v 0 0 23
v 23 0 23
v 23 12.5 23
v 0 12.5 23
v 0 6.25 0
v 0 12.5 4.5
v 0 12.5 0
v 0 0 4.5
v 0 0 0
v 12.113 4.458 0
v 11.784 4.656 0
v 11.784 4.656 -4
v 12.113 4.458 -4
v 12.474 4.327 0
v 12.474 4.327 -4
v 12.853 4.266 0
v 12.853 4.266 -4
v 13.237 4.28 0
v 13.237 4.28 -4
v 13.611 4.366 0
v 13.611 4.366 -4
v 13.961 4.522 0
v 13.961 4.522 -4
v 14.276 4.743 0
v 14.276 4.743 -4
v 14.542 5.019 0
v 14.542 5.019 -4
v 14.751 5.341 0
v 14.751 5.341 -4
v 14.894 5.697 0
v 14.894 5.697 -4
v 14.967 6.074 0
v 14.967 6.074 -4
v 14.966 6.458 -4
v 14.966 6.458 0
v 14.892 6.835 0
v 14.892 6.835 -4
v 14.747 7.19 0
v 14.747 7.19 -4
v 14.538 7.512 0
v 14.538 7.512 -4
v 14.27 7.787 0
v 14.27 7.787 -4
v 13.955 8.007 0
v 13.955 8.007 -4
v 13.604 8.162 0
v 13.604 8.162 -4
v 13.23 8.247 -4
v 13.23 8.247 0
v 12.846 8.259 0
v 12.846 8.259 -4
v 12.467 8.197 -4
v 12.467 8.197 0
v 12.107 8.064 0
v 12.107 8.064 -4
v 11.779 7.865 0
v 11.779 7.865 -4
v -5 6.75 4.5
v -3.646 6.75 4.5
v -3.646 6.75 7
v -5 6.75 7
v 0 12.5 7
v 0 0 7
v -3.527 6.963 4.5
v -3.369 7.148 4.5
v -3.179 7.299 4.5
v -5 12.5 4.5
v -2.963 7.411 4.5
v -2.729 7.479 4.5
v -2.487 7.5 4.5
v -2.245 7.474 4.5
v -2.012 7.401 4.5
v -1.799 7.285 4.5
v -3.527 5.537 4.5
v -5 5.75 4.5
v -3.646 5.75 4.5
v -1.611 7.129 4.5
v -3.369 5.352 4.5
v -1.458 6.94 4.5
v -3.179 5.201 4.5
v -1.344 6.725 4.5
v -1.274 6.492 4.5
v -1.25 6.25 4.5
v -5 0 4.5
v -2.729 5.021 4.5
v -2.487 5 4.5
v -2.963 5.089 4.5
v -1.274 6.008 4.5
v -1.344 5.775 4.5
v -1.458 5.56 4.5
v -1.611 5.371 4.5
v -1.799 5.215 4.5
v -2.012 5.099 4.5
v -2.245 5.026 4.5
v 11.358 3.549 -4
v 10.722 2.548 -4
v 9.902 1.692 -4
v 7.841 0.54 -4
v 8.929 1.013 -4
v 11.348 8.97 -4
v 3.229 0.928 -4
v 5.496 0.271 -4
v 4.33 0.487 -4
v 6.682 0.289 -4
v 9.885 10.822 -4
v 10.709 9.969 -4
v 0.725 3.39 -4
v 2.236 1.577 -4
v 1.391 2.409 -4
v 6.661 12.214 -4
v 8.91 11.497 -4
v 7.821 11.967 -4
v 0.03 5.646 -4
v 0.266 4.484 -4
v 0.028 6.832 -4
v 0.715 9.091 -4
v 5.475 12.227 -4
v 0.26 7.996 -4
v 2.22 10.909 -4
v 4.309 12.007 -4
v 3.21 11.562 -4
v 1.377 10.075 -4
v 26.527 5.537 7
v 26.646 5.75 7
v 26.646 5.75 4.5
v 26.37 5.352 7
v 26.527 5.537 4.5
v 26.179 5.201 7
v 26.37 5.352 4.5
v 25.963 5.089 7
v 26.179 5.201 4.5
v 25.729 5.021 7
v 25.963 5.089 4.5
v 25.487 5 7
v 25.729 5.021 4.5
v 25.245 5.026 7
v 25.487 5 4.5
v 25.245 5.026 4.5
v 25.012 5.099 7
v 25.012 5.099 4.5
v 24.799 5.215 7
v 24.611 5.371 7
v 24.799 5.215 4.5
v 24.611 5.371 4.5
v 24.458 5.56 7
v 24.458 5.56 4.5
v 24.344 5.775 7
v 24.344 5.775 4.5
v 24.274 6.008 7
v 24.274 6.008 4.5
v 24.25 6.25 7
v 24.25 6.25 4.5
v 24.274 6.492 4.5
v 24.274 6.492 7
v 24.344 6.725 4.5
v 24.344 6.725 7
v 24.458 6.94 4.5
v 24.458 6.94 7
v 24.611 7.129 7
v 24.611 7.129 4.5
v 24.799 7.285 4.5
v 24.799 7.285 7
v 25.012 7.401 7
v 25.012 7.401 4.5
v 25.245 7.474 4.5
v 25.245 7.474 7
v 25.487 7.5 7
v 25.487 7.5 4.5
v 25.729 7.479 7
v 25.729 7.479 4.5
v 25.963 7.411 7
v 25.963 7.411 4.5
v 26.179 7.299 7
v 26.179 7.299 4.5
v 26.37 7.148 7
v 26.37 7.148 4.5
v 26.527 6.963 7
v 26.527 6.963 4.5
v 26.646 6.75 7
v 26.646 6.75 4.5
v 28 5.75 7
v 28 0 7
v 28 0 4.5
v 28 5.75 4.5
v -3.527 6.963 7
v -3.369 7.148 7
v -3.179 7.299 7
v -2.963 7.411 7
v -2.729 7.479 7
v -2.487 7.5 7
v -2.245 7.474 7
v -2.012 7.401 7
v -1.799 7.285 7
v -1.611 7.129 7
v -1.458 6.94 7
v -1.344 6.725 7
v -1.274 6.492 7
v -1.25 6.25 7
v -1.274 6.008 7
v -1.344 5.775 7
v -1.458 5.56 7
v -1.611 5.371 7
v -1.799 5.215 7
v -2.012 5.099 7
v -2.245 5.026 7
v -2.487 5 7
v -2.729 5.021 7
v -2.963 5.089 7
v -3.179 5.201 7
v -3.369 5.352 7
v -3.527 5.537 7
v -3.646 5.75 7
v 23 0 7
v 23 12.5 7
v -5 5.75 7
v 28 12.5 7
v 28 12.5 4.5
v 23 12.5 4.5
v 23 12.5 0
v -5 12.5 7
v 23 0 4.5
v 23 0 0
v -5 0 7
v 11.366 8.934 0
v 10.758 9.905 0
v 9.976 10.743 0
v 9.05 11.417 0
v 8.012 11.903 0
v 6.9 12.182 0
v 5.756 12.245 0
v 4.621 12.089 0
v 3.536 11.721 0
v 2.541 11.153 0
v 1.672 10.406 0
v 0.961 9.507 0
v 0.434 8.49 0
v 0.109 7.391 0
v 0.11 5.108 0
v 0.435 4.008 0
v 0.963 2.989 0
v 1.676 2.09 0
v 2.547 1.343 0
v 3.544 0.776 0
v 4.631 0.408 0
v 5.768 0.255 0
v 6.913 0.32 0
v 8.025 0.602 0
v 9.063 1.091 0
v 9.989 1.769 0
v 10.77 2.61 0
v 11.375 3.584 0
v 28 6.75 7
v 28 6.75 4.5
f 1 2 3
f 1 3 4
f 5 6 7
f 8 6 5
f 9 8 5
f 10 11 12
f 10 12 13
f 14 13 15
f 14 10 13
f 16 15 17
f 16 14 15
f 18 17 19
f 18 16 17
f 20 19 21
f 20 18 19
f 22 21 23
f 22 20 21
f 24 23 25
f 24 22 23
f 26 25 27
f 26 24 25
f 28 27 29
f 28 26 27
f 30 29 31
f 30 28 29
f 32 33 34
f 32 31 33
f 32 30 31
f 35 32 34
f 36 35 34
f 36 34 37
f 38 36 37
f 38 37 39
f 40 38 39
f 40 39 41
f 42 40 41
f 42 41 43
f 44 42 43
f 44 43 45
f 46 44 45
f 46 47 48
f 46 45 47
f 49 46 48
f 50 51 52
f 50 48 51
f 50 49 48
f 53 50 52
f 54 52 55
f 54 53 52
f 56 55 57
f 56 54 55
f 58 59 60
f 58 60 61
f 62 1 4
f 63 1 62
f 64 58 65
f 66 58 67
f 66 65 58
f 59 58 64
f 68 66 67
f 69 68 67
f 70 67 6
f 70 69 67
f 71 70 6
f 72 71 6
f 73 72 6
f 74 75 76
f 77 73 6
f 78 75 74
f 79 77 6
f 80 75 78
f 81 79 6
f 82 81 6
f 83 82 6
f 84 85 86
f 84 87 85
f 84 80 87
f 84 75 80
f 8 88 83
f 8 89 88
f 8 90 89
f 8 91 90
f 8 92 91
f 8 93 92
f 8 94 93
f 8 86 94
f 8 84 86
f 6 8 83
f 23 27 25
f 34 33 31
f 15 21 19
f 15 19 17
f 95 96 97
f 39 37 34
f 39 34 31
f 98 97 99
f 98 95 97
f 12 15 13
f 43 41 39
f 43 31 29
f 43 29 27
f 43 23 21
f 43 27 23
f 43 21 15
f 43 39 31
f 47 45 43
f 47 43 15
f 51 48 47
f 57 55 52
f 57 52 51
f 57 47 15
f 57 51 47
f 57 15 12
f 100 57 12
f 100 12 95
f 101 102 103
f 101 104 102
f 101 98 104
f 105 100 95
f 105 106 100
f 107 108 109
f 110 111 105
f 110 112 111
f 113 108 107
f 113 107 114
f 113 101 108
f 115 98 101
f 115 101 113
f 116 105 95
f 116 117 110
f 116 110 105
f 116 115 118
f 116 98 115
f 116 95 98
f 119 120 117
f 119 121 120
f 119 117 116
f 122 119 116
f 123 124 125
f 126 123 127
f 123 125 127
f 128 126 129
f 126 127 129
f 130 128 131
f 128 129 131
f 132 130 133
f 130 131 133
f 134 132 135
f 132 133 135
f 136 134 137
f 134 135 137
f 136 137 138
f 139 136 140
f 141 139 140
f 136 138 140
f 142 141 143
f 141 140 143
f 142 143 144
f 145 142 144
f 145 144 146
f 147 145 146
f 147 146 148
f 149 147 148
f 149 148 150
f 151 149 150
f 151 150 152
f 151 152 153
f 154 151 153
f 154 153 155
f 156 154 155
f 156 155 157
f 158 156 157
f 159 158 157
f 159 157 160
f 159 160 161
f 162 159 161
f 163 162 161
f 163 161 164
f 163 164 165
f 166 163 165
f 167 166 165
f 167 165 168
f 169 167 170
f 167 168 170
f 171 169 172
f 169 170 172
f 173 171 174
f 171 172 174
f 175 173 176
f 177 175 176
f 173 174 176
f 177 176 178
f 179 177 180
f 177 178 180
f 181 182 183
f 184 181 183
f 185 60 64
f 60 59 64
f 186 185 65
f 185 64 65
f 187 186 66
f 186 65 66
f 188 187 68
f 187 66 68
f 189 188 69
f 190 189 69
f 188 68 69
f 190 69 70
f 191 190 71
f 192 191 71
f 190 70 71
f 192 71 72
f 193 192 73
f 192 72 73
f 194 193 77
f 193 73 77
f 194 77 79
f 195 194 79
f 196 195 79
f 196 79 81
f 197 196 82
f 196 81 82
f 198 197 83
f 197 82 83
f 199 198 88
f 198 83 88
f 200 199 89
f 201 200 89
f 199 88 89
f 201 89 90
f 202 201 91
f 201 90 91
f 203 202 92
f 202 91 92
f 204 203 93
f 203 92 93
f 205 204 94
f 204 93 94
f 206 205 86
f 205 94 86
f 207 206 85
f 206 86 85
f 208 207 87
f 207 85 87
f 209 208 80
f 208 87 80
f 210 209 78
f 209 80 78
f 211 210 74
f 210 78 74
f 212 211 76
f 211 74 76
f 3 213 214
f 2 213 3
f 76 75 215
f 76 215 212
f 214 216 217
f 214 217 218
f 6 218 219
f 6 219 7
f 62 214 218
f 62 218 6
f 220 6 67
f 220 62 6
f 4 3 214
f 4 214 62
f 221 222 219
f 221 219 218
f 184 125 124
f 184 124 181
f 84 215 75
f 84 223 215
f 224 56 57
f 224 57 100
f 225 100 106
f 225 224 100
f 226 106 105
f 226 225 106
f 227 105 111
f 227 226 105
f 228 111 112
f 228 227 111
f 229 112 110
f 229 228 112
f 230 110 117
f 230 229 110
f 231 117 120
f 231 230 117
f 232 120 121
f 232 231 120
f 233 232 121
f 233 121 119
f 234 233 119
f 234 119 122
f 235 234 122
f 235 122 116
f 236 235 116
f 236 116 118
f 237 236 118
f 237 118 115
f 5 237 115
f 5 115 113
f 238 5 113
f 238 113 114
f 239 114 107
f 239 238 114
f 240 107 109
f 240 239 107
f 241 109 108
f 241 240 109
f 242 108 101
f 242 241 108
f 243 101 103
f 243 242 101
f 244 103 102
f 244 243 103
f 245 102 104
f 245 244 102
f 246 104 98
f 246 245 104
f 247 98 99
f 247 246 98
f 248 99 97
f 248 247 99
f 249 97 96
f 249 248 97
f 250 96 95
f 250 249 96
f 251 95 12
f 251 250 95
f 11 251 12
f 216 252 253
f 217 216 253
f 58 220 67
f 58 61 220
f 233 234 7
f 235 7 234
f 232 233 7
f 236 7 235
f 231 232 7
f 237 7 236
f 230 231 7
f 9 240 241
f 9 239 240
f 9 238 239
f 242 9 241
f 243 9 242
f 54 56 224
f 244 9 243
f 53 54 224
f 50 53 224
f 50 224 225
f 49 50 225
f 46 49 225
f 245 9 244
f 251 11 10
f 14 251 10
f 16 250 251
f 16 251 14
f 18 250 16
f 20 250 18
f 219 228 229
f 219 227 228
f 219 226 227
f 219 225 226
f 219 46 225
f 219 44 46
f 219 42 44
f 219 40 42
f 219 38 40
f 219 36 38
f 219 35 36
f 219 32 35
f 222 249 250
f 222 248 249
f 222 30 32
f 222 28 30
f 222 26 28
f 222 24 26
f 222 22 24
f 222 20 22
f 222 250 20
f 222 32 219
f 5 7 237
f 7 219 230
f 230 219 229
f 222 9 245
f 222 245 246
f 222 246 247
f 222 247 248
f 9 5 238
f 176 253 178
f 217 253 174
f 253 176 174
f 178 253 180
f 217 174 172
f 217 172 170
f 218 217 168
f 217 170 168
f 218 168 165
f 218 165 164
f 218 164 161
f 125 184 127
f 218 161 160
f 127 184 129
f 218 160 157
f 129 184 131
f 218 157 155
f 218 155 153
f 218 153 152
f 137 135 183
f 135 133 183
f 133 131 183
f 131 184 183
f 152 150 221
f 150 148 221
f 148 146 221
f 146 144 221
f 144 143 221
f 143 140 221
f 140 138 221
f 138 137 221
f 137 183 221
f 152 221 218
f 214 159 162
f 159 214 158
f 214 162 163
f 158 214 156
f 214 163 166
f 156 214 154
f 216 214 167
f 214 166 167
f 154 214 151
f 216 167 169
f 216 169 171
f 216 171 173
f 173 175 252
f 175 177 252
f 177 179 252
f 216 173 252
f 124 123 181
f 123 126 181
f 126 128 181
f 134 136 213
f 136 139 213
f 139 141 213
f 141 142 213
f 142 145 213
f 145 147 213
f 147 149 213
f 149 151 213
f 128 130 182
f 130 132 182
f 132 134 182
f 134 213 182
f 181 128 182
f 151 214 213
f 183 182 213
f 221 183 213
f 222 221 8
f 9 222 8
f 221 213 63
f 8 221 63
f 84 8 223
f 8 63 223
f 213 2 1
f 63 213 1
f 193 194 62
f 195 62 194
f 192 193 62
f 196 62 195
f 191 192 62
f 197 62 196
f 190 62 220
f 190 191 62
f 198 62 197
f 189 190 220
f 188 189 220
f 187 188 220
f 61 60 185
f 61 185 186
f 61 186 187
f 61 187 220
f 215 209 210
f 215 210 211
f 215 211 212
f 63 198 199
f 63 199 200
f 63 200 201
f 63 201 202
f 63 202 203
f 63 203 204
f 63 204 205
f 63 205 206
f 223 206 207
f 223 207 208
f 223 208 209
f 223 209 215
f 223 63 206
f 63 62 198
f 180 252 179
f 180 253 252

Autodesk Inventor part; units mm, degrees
ref_plane "YZ Plane" through (0, 0, 0) normal (1, 0, 0) x (0, 1, 0)
ref_plane "XZ Plane" through (0, 0, 0) normal (0, 1, 0) x (-1, 0, 0)
ref_plane "XY Plane" through (0, 0, 0) normal (0, 0, 1) x (1, 0, 0)
sketch "Sketch1" plane through (0, 0, 0) normal (0, 1, 0) x (-1, 0, 0)
  line L0 (0, 0) -> (-23, 0)
  line L1 (-23, 0) -> (-23, 23)
  line L2 (-23, 23) -> (0, 23)
  line L3 (0, 23) -> (0, 0)
  line L4 (-23, 0) -> (-23, 7)
  line L5 (-23, 7) -> (-28, 7)
  line L6 (-28, 7) -> (-28, 4.5)
  line L7 (-28, 4.5) -> (-23, 4.5)
  line L8 (0, 7) -> (5, 7)
  line L9 (5, 7) -> (5, 4.5)
  line L10 (5, 4.5) -> (0, 4.5)
  dimension "d0" = 23
  dimension "d1" = 23
  dimension "d2" = 7
  dimension "d3" = 5
  dimension "d4" = 2.5
extrude "Extrusion1" add sketch "Sketch1" along normal blind 12.5
sketch "Sketch2" plane through (23, 0, 0) normal (0, 0, -1) x (-1, 0, 0)
  line L0 (23, 0) -> (23, 6.25)
  arc A0 (11.2156, 4.6561) -> (11.2214, 7.865) centre (17, 6.25) ccw
  arc A1 (11.2214, 7.865) -> (11.2156, 4.6561) centre (10.0244, 6.2627) ccw
extrude "Extrusion2" add sketch "Sketch2" along normal blind 4
sketch "Sketch3" plane through (28, 0, 4.5) normal (0, 0, -1) x (-1, 0, 0)
  line L0 (0, 0) -> (0, 12.5) projected
  line L1 (0, 6.25) -> (2.5, 6.25)
  circle A0 centre (2.5, 6.25) radius 1.25
  point P0 (28, 0)
  dimension "d11" = 2.5
  dimension "d12" = 2.5
extrude "Extrusion3" cut sketch "Sketch3" against normal blind 2.5
sketch "Sketch4" plane through (28, 0, 4.5) normal (0, 0, -1) x (-1, 0, 0)
  circle A0 centre (2.5, 6.25) radius 1.25 projected
  line L0 (0, 0) -> (0, 12.5) projected
  line L1 (1.25, 5.75) -> (0, 5.75)
  line L2 (1.25, 6.75) -> (0, 6.75)
  line L3 (1.25, 6.75) -> (1.3544, 6.75)
  line L4 (1.25, 5.75) -> (1.3544, 5.75)
  line L5 (0, 6.75) -> (0, 5.75)
  arc A1 (1.25, 6.25) -> (1.3544, 6.75) centre (2.5, 6.25) ccw
  point P0 (28, 0)
extrude "Extrusion4" cut sketch "Sketch4" against normal blind 2.5 contours A0 L4 L1 L0 L2 L3
sketch "Sketch5" plane through (28, 0, 4.5) normal (0, 0, -1) x (-1, 0, 0)
  line L0 (5, 0) -> (28, 0) projected
  line L1 (16.5, 0) -> (16.5, 12.5)
  line L2 (5, 12.5) -> (28, 12.5) projected
  arc A0 (1.3544, 5.75) -> (1.3544, 6.75) centre (2.5, 6.25) ccw projected
  line L3 (1.3544, 6.75) -> (0, 6.75) projected
  line L4 (1.3544, 6.75) -> (0, 6.75)
  line L5 (0, 6.75) -> (0, 5.75)
  line L6 (0, 5.75) -> (1.3544, 5.75)
  arc A1 (31.6456, 6.75) -> (31.6456, 5.75) centre (30.5, 6.25) ccw
  line L7 (31.6456, 6.75) -> (33, 6.75)
  line L8 (33, 6.75) -> (33, 5.75)
  line L9 (33, 5.75) -> (31.6456, 5.75)
extrude "Extrusion5" cut sketch "Sketch5" against normal blind 2.5 contours L7 L8 L9 A1
properties part number "Micro servo"
